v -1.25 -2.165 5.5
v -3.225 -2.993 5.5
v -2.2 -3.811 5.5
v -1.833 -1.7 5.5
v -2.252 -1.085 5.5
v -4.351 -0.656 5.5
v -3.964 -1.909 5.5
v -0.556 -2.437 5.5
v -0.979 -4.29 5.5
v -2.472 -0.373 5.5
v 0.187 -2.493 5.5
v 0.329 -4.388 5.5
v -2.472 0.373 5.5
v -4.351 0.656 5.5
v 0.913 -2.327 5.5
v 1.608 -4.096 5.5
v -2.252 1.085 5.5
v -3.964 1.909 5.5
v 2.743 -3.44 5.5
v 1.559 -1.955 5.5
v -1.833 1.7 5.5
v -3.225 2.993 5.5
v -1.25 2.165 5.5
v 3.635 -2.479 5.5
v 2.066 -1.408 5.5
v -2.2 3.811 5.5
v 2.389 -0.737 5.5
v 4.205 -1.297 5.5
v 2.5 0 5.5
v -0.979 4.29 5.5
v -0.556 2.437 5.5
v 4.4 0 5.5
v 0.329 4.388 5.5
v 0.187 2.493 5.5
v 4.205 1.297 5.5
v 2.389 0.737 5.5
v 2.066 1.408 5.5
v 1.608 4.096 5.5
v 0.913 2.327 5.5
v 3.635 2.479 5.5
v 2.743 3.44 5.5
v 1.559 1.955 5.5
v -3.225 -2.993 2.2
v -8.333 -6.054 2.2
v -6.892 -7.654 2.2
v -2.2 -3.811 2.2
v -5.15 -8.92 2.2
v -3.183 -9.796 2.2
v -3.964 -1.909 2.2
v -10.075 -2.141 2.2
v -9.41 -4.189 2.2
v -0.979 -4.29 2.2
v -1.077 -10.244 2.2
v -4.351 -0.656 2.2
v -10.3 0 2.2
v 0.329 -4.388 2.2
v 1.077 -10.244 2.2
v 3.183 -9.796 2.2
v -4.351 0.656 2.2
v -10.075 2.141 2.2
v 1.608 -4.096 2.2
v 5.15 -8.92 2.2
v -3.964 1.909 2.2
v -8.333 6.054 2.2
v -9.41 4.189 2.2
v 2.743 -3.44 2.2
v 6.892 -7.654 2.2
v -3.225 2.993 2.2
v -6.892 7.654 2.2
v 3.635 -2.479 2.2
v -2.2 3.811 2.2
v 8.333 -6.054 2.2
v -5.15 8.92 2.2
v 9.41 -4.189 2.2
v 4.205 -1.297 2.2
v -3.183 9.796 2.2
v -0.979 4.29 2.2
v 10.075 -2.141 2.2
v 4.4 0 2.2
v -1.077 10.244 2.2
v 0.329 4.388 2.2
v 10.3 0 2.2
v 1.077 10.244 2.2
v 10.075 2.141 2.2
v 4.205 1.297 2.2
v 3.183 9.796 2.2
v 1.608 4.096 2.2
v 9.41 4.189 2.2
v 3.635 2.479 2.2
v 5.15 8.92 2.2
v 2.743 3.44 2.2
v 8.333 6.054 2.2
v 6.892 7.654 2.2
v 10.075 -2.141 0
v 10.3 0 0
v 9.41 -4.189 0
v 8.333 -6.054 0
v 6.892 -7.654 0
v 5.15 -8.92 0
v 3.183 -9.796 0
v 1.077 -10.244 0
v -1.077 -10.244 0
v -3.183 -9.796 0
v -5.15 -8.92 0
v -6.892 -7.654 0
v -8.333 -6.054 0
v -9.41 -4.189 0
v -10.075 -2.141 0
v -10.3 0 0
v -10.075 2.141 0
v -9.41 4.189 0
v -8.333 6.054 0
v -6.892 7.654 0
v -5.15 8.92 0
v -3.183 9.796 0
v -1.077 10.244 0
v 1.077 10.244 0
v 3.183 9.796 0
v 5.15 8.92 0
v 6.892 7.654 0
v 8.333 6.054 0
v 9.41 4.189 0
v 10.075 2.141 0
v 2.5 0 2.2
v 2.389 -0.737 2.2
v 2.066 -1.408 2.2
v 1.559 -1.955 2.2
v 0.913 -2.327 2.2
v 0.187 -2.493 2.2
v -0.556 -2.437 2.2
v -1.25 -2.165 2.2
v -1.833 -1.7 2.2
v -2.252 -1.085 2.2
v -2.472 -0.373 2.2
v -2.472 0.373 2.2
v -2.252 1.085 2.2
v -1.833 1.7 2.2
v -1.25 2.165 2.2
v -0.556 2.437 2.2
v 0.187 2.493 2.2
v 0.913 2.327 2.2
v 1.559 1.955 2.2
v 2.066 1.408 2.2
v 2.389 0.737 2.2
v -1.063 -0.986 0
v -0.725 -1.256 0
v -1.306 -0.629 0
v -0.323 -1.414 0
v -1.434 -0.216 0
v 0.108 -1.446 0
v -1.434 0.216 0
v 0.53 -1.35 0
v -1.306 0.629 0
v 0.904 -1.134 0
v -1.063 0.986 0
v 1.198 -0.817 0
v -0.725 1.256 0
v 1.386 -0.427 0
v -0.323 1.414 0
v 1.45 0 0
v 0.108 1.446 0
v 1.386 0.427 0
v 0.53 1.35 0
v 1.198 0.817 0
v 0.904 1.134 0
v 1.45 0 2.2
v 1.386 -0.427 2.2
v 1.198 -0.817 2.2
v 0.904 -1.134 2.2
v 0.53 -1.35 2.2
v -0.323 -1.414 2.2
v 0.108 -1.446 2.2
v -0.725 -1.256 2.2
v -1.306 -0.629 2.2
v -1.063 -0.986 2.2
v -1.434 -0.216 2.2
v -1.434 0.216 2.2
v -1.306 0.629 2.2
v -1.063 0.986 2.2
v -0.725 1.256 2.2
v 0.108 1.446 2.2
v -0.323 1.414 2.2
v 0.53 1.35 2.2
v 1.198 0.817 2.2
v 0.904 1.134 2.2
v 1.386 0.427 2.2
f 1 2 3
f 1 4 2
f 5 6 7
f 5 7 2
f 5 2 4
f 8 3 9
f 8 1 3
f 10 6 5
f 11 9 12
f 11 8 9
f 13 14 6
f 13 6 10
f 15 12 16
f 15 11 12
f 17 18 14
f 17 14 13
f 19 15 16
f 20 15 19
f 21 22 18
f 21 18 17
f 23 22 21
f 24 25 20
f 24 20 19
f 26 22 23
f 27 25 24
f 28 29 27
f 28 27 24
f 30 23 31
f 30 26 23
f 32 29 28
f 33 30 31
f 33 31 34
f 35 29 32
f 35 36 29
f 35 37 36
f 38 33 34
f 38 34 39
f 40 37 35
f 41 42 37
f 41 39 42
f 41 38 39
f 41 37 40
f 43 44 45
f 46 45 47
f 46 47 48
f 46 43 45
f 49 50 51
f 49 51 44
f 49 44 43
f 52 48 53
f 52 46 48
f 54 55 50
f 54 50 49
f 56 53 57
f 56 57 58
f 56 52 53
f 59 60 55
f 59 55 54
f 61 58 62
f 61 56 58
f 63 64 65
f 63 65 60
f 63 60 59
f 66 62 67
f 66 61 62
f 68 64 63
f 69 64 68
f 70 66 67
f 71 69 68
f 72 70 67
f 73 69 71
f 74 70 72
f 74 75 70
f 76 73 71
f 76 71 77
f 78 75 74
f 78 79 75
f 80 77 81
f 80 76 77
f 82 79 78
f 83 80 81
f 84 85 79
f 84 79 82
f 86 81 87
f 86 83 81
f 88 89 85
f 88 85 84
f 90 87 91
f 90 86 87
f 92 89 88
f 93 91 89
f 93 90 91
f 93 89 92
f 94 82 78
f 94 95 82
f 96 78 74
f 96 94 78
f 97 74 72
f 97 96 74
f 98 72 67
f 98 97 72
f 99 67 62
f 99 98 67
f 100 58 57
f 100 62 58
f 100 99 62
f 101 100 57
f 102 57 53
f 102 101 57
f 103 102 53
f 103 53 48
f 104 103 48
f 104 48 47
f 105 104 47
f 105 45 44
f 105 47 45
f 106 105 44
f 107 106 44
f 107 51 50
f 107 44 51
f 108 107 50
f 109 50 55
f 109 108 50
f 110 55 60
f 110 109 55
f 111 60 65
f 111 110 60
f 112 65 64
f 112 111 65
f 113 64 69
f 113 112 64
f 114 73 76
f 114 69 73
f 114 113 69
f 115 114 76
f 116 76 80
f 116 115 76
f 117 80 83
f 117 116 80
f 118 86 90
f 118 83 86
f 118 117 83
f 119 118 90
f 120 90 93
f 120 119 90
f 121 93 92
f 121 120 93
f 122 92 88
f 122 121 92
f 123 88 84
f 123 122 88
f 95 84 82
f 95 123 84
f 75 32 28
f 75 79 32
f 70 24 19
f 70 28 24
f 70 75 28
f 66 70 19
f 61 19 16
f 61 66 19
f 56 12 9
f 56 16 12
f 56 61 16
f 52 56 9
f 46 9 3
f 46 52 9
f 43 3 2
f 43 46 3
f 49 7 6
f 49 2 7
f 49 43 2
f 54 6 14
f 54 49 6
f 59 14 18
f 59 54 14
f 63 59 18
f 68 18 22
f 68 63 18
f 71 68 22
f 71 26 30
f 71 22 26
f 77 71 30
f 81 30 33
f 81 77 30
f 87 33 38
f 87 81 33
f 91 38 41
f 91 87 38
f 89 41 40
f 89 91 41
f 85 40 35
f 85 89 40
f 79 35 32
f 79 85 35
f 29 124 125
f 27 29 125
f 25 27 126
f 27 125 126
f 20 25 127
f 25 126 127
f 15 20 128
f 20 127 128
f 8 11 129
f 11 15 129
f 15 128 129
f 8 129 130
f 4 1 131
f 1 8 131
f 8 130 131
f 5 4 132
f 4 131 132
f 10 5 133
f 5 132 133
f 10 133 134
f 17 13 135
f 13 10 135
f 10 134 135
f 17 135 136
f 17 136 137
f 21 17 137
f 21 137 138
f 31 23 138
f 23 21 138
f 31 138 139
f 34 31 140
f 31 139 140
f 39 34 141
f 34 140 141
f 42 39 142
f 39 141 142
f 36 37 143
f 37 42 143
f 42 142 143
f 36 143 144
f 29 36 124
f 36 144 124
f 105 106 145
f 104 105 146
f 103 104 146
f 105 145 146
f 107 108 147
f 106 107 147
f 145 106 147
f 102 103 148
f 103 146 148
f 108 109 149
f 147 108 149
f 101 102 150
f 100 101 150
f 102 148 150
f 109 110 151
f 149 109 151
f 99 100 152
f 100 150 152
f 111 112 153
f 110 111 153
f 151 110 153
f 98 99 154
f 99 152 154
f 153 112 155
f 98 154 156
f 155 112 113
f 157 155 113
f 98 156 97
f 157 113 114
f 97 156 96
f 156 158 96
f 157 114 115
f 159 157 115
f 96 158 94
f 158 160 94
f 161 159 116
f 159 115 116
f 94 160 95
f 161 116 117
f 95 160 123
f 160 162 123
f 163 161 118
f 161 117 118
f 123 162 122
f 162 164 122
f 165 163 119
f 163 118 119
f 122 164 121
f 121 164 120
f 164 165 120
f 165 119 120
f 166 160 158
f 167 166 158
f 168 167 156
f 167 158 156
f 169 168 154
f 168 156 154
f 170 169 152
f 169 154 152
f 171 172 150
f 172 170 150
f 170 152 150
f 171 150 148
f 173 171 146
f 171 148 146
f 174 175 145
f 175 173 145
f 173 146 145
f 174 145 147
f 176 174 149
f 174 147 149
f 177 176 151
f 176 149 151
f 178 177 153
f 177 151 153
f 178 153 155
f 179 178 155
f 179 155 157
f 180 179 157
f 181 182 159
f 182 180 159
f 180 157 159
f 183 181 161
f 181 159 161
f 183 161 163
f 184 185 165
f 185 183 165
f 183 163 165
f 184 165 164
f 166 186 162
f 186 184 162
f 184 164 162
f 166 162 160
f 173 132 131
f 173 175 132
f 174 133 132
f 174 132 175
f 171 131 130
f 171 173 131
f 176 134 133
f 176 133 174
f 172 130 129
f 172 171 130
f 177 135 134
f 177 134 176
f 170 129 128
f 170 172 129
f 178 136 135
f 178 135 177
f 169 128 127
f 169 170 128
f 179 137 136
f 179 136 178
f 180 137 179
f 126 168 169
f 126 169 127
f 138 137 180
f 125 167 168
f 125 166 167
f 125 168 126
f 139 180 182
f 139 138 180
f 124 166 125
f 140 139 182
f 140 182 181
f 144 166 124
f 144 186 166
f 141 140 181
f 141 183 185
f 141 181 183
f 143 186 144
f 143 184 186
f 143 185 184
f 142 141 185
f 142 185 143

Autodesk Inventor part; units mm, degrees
ref_plane "YZ Plane" through (0, 0, 0) normal (1, 0, 0) x (0, 1, 0)
ref_plane "XZ Plane" through (0, 0, 0) normal (0, 1, 0) x (-1, 0, 0)
ref_plane "XY Plane" through (0, 0, 0) normal (0, 0, 1) x (1, 0, 0)
sketch "Sketch1" plane through (0, 0, 0) normal (0, 0, 1) x (1, 0, 0)
  circle A0 centre (0, 0) radius 10.3
  circle A1 centre (0, 0) radius 1.45
  dimension "d0" = 20.6
  dimension "d7" = 2.9
extrude "Extrusion1" add sketch "Sketch1" along normal blind 2.2
sketch "Sketch2" plane through (0, 0, 2.2) normal (0, 0, 1) x (1, 0, 0)
  circle A0 centre (0, 0) radius 4.4
  circle A1 centre (0, 0) radius 2.5
  dimension "d3" = 8.8
  dimension "d4" = 5
extrude "Extrusion2" add sketch "Sketch2" along normal blind 3.3
properties part number "orczyk serwa okrągły 02-2"
